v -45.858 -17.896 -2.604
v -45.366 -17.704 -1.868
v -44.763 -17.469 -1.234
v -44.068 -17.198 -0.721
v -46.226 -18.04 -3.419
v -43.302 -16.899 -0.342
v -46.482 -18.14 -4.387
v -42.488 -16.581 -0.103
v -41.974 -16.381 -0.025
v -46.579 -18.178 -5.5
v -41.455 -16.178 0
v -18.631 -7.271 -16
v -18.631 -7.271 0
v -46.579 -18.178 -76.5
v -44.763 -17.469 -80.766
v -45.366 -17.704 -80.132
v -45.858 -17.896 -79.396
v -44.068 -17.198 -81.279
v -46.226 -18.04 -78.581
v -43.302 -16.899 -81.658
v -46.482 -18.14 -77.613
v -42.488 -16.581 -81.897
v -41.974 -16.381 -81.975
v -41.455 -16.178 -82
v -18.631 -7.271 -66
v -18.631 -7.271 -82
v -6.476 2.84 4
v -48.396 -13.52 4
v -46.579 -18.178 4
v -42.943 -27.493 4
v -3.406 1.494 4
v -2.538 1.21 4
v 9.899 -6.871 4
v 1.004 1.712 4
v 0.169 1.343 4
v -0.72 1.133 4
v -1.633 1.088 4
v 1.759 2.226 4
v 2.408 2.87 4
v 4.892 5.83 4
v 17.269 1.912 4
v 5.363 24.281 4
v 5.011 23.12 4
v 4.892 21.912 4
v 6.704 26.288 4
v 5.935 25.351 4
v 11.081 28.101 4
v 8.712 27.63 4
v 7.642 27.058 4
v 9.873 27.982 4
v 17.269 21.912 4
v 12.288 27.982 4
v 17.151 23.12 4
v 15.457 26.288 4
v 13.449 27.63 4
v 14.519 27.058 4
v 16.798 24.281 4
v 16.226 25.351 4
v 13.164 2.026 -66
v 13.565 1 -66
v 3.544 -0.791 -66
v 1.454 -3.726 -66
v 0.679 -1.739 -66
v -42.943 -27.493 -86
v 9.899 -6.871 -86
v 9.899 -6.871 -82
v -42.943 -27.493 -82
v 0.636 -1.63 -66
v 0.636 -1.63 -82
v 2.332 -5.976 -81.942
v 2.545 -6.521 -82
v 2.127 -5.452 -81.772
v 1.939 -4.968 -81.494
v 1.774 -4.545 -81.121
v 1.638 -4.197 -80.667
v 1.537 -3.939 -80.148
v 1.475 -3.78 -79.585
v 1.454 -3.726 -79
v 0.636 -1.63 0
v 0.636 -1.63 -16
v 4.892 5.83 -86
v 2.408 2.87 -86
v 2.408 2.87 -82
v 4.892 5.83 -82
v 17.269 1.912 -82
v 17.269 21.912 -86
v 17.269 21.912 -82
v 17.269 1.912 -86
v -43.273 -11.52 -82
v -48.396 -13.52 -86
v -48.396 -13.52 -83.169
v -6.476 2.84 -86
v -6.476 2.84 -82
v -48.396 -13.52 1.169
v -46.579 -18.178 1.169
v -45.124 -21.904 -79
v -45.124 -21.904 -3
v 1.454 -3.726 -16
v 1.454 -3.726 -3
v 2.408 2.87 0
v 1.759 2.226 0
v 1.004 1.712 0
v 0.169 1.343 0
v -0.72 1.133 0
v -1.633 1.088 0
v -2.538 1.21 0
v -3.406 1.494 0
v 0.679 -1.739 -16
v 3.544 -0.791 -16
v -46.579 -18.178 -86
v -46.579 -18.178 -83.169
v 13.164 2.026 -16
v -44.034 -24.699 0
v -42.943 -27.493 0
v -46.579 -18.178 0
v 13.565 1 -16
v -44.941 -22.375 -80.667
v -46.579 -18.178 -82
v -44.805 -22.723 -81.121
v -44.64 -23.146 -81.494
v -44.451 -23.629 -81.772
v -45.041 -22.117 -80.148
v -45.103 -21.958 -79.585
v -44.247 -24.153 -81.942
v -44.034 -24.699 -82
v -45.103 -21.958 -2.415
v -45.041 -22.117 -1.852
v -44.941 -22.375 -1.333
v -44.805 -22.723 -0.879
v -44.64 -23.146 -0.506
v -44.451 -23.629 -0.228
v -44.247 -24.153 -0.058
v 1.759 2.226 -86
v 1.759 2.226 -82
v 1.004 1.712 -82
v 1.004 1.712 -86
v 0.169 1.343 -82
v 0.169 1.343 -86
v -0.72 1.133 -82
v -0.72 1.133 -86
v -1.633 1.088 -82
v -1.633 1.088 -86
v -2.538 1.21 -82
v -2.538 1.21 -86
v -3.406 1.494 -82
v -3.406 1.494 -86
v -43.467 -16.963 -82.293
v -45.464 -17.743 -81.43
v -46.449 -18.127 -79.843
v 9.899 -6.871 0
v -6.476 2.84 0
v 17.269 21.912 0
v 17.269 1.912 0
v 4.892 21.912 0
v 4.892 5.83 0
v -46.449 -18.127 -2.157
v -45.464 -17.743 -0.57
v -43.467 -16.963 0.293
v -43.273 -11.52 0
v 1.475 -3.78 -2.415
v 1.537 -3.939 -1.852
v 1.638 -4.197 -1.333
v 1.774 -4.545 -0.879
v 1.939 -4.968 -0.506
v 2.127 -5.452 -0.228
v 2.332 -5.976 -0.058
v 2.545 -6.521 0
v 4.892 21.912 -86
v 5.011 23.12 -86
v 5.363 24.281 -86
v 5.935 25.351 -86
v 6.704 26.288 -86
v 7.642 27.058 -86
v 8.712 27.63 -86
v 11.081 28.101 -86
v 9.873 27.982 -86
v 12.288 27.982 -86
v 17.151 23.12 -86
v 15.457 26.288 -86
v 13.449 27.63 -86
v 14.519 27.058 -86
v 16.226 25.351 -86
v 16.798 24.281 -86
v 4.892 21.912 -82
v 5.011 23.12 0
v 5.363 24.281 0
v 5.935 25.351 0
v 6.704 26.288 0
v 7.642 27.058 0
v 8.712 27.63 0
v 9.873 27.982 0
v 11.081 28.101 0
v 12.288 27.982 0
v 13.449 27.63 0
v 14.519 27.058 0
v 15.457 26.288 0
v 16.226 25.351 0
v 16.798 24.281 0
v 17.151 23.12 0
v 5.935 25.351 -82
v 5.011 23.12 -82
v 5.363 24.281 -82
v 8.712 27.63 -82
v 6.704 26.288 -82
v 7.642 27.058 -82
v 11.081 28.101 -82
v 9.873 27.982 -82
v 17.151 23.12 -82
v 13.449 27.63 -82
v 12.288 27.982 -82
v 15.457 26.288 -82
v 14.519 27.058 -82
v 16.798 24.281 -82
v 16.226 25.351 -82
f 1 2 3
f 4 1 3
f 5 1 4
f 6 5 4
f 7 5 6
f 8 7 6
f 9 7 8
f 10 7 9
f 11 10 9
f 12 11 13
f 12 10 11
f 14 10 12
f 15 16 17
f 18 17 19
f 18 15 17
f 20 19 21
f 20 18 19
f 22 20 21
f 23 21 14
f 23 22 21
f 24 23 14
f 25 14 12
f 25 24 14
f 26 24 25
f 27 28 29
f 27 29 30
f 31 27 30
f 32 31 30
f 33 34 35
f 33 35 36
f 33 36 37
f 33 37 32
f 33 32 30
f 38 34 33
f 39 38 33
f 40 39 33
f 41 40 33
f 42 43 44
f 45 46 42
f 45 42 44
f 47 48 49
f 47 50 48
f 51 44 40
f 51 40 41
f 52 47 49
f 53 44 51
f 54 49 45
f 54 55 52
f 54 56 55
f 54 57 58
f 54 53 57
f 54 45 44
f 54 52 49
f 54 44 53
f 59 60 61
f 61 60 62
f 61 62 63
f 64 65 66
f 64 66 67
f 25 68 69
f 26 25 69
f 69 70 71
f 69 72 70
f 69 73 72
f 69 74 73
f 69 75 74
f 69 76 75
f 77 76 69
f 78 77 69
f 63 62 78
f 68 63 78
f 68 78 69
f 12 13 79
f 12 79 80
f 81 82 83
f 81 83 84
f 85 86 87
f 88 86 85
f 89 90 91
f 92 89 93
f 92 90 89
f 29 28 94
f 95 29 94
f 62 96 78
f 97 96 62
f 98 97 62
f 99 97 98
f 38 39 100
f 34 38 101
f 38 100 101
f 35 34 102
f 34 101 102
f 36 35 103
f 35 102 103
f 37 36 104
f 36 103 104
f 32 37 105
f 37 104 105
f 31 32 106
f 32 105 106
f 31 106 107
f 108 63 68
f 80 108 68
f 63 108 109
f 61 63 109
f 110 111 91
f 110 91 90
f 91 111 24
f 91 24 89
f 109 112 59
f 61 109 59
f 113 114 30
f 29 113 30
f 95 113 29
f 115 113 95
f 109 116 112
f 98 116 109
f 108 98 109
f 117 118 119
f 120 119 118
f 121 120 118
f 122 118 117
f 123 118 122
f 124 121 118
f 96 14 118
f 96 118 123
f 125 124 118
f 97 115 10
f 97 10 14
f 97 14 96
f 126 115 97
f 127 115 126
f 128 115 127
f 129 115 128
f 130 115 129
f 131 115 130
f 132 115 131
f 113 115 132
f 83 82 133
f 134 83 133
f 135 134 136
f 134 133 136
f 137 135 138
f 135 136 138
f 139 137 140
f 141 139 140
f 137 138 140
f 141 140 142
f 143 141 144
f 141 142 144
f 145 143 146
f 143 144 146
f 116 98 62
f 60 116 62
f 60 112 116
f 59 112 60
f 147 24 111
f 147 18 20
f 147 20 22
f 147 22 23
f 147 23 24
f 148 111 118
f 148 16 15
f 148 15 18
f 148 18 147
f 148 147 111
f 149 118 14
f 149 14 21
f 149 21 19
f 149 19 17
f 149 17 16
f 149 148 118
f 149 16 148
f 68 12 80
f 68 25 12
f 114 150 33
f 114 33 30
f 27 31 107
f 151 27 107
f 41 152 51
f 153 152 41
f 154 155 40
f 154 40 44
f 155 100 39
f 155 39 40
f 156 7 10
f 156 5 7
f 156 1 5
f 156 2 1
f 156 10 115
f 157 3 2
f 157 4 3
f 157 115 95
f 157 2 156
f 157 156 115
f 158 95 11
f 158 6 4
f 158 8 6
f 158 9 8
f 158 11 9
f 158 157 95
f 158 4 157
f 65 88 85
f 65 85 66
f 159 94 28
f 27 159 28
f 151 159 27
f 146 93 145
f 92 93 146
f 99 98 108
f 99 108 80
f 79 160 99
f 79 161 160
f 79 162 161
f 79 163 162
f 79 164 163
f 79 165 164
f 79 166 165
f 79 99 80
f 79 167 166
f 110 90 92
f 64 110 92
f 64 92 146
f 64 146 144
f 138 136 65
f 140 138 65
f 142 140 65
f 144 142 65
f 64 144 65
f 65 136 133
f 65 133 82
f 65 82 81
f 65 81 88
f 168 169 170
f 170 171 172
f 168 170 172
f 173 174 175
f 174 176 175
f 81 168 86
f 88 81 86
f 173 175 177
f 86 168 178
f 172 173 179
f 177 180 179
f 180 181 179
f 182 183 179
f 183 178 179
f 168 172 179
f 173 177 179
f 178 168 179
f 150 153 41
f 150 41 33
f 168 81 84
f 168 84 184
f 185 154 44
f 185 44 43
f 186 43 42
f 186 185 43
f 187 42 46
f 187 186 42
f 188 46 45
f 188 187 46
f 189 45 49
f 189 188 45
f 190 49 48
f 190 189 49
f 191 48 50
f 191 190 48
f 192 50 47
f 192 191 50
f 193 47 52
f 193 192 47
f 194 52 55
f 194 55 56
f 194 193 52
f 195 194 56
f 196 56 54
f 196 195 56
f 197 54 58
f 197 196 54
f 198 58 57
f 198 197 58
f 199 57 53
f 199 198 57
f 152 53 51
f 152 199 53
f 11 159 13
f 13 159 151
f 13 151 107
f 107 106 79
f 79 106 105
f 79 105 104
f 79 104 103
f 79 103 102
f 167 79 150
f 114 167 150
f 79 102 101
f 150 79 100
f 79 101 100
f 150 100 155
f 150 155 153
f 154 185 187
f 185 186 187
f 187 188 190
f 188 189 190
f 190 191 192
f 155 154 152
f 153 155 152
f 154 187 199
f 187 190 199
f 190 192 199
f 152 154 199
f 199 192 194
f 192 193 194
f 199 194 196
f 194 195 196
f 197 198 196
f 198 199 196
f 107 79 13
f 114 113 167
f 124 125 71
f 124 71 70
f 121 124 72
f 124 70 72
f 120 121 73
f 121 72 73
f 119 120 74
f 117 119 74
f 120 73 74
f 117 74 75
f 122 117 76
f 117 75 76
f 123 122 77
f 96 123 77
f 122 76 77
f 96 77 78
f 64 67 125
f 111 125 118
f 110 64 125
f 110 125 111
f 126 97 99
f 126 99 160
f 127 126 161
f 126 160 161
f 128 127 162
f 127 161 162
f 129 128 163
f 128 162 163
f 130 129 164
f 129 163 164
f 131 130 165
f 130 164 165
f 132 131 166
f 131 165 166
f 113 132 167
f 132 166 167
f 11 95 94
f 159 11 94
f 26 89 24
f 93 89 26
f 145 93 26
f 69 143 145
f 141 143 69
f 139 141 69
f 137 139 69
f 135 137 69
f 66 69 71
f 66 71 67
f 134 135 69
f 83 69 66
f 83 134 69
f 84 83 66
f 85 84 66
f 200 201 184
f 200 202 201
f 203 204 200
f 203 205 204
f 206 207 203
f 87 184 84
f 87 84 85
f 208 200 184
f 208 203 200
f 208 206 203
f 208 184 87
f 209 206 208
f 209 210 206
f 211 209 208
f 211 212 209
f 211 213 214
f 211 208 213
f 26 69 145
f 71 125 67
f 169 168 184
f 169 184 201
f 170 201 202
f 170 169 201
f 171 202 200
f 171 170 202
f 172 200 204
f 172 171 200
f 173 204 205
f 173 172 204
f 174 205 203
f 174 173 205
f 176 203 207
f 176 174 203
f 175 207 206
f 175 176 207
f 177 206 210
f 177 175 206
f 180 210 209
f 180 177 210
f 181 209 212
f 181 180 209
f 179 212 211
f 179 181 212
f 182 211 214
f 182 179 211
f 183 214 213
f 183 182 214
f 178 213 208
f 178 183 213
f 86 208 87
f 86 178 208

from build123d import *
from OCP.BRepFilletAPI import BRepFilletAPI_MakeChamfer

# Parameters (mm, degrees)
ESTRUSIONE_ESTRUSIONE1_DEPTH = 4
ESTRUSIONE_ESTRUSIONE2_DEPTH = 82
ESTRUSIONE_ESTRUSIONE3_START = 4
ESTRUSIONE_ESTRUSIONE3_DEPTH = 4
SCHIZZO6_W                   = 50
SCHIZZO6_H                   = 4
ESTRUSIONE_ESTRUSIONE4_DEPTH = 5
SMUSSO1_SIZE                 = 5.5
SMUSSO1_SIZE2                = 1.169061089
RACCORDO1_R                  = 3
SMUSSO2_SIZE                 = 5
RACCORDO2_START              = -86
RACCORDO2_DEPTH              = 4
RACCORDO2_2_DEPTH            = 4
SCHIZZO7_W                   = 50
SCHIZZO7_H                   = 2.5
ESTRUSIONE_ESTRUSIONE5_DEPTH = 13
SMUSSO3_SIZE                 = 20
SMUSSO3_SIZE_2               = 1.048155586
SMUSSO4_SIZE                 = 20
SMUSSO4_SIZE2                = 1.749773271
SMUSSO5_SIZE                 = 10
SMUSSO5_SIZE2                = 0.350328071


with BuildPart() as part:
    # Schizzo1 → Estrusione-Estrusione1 (new body)
    with BuildSketch(Plane.XY):
        with BuildLine():
            Line((4.891723927, 5.829729564), (4.891723927, 21.912236928))
            ThreePointArc((4.891723927, 21.912236928), (11.08058435, 28.101097351), (17.269444773, 21.912236928))
            Line((17.269444773, 21.912236928), (17.269444773, 1.912236928))
            Line((17.269444773, 1.912236928), (9.899185428, -6.871296125))
            Line((9.899185428, -6.871296125), (-42.94312967, -27.493410377))
            Line((-42.94312967, -27.493410377), (-46.57866514, -18.177677349))
            Line((-46.57866514, -18.177677349), (0, 0))
            Line((0, 0), (4.891723927, 5.829729564))
        make_face()
    extrude(amount=ESTRUSIONE_ESTRUSIONE1_DEPTH)

    # Schizzo4 → Estrusione-Estrusione2 (add)
    with BuildSketch(Plane.XY):
        Polygon((-45.124450952, -21.90397056), (1.454214188, -3.726293211), (0, 0), (-46.57866514, -18.177677349), align=None)
    extrude(amount=-ESTRUSIONE_ESTRUSIONE2_DEPTH)

    # Schizzo5 → Estrusione-Estrusione3 (add)
    with BuildSketch(Plane(origin=(0, 0, -82), x_dir=(-1, 0, 0), z_dir=(0, 0, -1)).offset(ESTRUSIONE_ESTRUSIONE3_START)):
        with BuildLine():
            Line((42.94312967, -27.493410377), (46.57866514, -18.177677349))
            Line((46.57866514, -18.177677349), (0, 0))
            Line((0, 0), (-4.891723927, 5.829729564))
            Line((-4.891723927, 5.829729564), (-4.891723927, 21.912236928))
            ThreePointArc((-4.891723927, 21.912236928), (-11.08058435, 28.101097351), (-17.269444773, 21.912236928))
            Line((-17.269444773, 21.912236928), (-17.269444773, 1.912236928))
            Line((-17.269444773, 1.912236928), (-9.899185428, -6.871296125))
            Line((-9.899185428, -6.871296125), (42.94312967, -27.493410377))
        make_face()
    extrude(amount=-ESTRUSIONE_ESTRUSIONE3_DEPTH)

    # Schizzo6 → Estrusione-Estrusione4 (add)
    with BuildSketch(Plane(origin=(0, 0, 0), x_dir=(0.9315733027957475, 0.36355354697516373, 0), z_dir=(-0.36355354697516373, 0.9315733027957475, 0))):
        with Locations((-25, 84)):
            Rectangle(SCHIZZO6_W, SCHIZZO6_H)
        with Locations((-25, -2)):
            Rectangle(SCHIZZO6_W, SCHIZZO6_H)
    extrude(amount=ESTRUSIONE_ESTRUSIONE4_DEPTH)

    # Smusso1: one chamfer whose edges measure the first distance from different faces: ONE call of the kernel's chamfer builder (chamfer() names one face for all edges)
    smusso1_edges_1 = [part.edges().sort_by_distance(p)[0] for p in [
        (-47.487549007, -15.848744092, -82),
    ]]
    smusso1_side_1 = [part.faces().sort_by_distance(p)[0] for p in [
        (-24.198216437, -6.759905417, -82),
    ]]
    smusso1_edges_2 = [part.edges().sort_by_distance(p)[0] for p in [
        (-47.487549007, -15.848744092, 0),
    ]]
    smusso1_side_2 = [part.faces().sort_by_distance(p)[0] for p in [
        (-24.198216437, -6.759905417, 0),
    ]]
    smusso1 = BRepFilletAPI_MakeChamfer(part.part.solid().wrapped)
    for e in smusso1_edges_1:
        smusso1.Add(SMUSSO1_SIZE, SMUSSO1_SIZE2, e.wrapped, smusso1_side_1[0].wrapped)  # the first distance lies on this face
    for e in smusso1_edges_2:
        smusso1.Add(SMUSSO1_SIZE, SMUSSO1_SIZE2, e.wrapped, smusso1_side_2[0].wrapped)  # the first distance lies on this face
    add(Compound.cast(smusso1.Shape()), mode=Mode.REPLACE)

    # Raccordo1
    raccordo1_edges = [part.edges().sort_by_distance(p)[0] for p in [
        (-21.835118382, -12.815131886, -82),
        (-21.835118382, -12.815131886, 0),
    ]]
    fillet(raccordo1_edges, radius=RACCORDO1_R)

    # Smusso2
    smusso2_edges = [part.edges().sort_by_distance(p)[0] for p in [
        (-1.817767735, 4.657866514, 2),
        (-1.817767735, 4.657866514, -84),
    ]]
    chamfer(smusso2_edges, length=SMUSSO2_SIZE - 0.0001)  # a hair under: the kernel refuses the full size

    # Raccordo2: read off the stored shape, not the designer's step
    # Raccordo2 outline → Raccordo2 (add)
    with BuildSketch(Plane.XY.offset(RACCORDO2_START)):
        with BuildLine():
            Line((0, 0), (2.407895765, 2.869618428))
            ThreePointArc((2.407895765, 2.869618428), (-0.284030607, 1.214852073), (-3.430579557, 1.504591587))
            Line((-3.430579557, 1.504591587), (0, 0))
        make_face()
    extrude(amount=RACCORDO2_DEPTH)

    # Raccordo2 2 outline → Raccordo2 2 (add)
    with BuildSketch(Plane.XY):
        with BuildLine():
            Line((0, 0), (2.407895765, 2.869618428))
            ThreePointArc((2.407895765, 2.869618428), (-0.284030607, 1.214852073), (-3.430579557, 1.504591587))
            Line((-3.430579557, 1.504591587), (0, 0))
        make_face()
    extrude(amount=RACCORDO2_2_DEPTH)

    # Schizzo7 → Estrusione-Estrusione5 (add)
    with BuildSketch(Plane(origin=(0, 0, 0), x_dir=(0, 0, -1), z_dir=(0.9315733027957472, 0.3635535469751644, 0))):
        with Locations((41, -2.75)):
            Rectangle(SCHIZZO7_W, SCHIZZO7_H)
    extrude(amount=ESTRUSIONE_ESTRUSIONE5_DEPTH)

    # Smusso3
    # the kernel refuses this chamfer: 20, 1.048155586 mm, written as the material it takes off along each edge
    with BuildSketch(Plane(origin=(12.655783257, 3.328836156, -16), x_dir=(-0.9315733027957472, -0.3635535469751644, 0), z_dir=(0, 0, -1))) as smusso3_piece_1_section:
        Polygon((SMUSSO3_SIZE, 0), (0, -SMUSSO3_SIZE_2), (0, 0), align=None)
    smusso3_piece_1 = extrude(amount=50, mode=Mode.PRIVATE)
    smusso3_piece_1 = split(smusso3_piece_1, bisect_by=Plane(origin=(0.54533032, -1.397359954, -16), z_dir=(0.9315733027957472, 0.36355354697516445, 0)), keep=Keep.TOP, mode=Mode.PRIVATE)
    add(smusso3_piece_1, mode=Mode.SUBTRACT)

    # Smusso4
    smusso4_edges = [part.edges().sort_by_distance(p)[0] for p in [
        (0, 0, -41),
    ]]
    smusso4_side = [part.faces().sort_by_distance(p)[0] for p in [
        (-23.323124739, -9.102026325, -41),
    ]]
    chamfer(smusso4_edges, length=SMUSSO4_SIZE, length2=SMUSSO4_SIZE2, reference=smusso4_side[0])

    # Smusso5
    smusso5_edges = [part.edges().sort_by_distance(p)[0] for p in [
        (13.036843938, 2.352402395, -41),
    ]]
    smusso5_side = [part.faces().sort_by_distance(p)[0] for p in [
        (6.857772748, 0.306645312, -41),
    ]]
    chamfer(smusso5_edges, length=SMUSSO5_SIZE, length2=SMUSSO5_SIZE2, reference=smusso5_side[0])


solid = part.part
